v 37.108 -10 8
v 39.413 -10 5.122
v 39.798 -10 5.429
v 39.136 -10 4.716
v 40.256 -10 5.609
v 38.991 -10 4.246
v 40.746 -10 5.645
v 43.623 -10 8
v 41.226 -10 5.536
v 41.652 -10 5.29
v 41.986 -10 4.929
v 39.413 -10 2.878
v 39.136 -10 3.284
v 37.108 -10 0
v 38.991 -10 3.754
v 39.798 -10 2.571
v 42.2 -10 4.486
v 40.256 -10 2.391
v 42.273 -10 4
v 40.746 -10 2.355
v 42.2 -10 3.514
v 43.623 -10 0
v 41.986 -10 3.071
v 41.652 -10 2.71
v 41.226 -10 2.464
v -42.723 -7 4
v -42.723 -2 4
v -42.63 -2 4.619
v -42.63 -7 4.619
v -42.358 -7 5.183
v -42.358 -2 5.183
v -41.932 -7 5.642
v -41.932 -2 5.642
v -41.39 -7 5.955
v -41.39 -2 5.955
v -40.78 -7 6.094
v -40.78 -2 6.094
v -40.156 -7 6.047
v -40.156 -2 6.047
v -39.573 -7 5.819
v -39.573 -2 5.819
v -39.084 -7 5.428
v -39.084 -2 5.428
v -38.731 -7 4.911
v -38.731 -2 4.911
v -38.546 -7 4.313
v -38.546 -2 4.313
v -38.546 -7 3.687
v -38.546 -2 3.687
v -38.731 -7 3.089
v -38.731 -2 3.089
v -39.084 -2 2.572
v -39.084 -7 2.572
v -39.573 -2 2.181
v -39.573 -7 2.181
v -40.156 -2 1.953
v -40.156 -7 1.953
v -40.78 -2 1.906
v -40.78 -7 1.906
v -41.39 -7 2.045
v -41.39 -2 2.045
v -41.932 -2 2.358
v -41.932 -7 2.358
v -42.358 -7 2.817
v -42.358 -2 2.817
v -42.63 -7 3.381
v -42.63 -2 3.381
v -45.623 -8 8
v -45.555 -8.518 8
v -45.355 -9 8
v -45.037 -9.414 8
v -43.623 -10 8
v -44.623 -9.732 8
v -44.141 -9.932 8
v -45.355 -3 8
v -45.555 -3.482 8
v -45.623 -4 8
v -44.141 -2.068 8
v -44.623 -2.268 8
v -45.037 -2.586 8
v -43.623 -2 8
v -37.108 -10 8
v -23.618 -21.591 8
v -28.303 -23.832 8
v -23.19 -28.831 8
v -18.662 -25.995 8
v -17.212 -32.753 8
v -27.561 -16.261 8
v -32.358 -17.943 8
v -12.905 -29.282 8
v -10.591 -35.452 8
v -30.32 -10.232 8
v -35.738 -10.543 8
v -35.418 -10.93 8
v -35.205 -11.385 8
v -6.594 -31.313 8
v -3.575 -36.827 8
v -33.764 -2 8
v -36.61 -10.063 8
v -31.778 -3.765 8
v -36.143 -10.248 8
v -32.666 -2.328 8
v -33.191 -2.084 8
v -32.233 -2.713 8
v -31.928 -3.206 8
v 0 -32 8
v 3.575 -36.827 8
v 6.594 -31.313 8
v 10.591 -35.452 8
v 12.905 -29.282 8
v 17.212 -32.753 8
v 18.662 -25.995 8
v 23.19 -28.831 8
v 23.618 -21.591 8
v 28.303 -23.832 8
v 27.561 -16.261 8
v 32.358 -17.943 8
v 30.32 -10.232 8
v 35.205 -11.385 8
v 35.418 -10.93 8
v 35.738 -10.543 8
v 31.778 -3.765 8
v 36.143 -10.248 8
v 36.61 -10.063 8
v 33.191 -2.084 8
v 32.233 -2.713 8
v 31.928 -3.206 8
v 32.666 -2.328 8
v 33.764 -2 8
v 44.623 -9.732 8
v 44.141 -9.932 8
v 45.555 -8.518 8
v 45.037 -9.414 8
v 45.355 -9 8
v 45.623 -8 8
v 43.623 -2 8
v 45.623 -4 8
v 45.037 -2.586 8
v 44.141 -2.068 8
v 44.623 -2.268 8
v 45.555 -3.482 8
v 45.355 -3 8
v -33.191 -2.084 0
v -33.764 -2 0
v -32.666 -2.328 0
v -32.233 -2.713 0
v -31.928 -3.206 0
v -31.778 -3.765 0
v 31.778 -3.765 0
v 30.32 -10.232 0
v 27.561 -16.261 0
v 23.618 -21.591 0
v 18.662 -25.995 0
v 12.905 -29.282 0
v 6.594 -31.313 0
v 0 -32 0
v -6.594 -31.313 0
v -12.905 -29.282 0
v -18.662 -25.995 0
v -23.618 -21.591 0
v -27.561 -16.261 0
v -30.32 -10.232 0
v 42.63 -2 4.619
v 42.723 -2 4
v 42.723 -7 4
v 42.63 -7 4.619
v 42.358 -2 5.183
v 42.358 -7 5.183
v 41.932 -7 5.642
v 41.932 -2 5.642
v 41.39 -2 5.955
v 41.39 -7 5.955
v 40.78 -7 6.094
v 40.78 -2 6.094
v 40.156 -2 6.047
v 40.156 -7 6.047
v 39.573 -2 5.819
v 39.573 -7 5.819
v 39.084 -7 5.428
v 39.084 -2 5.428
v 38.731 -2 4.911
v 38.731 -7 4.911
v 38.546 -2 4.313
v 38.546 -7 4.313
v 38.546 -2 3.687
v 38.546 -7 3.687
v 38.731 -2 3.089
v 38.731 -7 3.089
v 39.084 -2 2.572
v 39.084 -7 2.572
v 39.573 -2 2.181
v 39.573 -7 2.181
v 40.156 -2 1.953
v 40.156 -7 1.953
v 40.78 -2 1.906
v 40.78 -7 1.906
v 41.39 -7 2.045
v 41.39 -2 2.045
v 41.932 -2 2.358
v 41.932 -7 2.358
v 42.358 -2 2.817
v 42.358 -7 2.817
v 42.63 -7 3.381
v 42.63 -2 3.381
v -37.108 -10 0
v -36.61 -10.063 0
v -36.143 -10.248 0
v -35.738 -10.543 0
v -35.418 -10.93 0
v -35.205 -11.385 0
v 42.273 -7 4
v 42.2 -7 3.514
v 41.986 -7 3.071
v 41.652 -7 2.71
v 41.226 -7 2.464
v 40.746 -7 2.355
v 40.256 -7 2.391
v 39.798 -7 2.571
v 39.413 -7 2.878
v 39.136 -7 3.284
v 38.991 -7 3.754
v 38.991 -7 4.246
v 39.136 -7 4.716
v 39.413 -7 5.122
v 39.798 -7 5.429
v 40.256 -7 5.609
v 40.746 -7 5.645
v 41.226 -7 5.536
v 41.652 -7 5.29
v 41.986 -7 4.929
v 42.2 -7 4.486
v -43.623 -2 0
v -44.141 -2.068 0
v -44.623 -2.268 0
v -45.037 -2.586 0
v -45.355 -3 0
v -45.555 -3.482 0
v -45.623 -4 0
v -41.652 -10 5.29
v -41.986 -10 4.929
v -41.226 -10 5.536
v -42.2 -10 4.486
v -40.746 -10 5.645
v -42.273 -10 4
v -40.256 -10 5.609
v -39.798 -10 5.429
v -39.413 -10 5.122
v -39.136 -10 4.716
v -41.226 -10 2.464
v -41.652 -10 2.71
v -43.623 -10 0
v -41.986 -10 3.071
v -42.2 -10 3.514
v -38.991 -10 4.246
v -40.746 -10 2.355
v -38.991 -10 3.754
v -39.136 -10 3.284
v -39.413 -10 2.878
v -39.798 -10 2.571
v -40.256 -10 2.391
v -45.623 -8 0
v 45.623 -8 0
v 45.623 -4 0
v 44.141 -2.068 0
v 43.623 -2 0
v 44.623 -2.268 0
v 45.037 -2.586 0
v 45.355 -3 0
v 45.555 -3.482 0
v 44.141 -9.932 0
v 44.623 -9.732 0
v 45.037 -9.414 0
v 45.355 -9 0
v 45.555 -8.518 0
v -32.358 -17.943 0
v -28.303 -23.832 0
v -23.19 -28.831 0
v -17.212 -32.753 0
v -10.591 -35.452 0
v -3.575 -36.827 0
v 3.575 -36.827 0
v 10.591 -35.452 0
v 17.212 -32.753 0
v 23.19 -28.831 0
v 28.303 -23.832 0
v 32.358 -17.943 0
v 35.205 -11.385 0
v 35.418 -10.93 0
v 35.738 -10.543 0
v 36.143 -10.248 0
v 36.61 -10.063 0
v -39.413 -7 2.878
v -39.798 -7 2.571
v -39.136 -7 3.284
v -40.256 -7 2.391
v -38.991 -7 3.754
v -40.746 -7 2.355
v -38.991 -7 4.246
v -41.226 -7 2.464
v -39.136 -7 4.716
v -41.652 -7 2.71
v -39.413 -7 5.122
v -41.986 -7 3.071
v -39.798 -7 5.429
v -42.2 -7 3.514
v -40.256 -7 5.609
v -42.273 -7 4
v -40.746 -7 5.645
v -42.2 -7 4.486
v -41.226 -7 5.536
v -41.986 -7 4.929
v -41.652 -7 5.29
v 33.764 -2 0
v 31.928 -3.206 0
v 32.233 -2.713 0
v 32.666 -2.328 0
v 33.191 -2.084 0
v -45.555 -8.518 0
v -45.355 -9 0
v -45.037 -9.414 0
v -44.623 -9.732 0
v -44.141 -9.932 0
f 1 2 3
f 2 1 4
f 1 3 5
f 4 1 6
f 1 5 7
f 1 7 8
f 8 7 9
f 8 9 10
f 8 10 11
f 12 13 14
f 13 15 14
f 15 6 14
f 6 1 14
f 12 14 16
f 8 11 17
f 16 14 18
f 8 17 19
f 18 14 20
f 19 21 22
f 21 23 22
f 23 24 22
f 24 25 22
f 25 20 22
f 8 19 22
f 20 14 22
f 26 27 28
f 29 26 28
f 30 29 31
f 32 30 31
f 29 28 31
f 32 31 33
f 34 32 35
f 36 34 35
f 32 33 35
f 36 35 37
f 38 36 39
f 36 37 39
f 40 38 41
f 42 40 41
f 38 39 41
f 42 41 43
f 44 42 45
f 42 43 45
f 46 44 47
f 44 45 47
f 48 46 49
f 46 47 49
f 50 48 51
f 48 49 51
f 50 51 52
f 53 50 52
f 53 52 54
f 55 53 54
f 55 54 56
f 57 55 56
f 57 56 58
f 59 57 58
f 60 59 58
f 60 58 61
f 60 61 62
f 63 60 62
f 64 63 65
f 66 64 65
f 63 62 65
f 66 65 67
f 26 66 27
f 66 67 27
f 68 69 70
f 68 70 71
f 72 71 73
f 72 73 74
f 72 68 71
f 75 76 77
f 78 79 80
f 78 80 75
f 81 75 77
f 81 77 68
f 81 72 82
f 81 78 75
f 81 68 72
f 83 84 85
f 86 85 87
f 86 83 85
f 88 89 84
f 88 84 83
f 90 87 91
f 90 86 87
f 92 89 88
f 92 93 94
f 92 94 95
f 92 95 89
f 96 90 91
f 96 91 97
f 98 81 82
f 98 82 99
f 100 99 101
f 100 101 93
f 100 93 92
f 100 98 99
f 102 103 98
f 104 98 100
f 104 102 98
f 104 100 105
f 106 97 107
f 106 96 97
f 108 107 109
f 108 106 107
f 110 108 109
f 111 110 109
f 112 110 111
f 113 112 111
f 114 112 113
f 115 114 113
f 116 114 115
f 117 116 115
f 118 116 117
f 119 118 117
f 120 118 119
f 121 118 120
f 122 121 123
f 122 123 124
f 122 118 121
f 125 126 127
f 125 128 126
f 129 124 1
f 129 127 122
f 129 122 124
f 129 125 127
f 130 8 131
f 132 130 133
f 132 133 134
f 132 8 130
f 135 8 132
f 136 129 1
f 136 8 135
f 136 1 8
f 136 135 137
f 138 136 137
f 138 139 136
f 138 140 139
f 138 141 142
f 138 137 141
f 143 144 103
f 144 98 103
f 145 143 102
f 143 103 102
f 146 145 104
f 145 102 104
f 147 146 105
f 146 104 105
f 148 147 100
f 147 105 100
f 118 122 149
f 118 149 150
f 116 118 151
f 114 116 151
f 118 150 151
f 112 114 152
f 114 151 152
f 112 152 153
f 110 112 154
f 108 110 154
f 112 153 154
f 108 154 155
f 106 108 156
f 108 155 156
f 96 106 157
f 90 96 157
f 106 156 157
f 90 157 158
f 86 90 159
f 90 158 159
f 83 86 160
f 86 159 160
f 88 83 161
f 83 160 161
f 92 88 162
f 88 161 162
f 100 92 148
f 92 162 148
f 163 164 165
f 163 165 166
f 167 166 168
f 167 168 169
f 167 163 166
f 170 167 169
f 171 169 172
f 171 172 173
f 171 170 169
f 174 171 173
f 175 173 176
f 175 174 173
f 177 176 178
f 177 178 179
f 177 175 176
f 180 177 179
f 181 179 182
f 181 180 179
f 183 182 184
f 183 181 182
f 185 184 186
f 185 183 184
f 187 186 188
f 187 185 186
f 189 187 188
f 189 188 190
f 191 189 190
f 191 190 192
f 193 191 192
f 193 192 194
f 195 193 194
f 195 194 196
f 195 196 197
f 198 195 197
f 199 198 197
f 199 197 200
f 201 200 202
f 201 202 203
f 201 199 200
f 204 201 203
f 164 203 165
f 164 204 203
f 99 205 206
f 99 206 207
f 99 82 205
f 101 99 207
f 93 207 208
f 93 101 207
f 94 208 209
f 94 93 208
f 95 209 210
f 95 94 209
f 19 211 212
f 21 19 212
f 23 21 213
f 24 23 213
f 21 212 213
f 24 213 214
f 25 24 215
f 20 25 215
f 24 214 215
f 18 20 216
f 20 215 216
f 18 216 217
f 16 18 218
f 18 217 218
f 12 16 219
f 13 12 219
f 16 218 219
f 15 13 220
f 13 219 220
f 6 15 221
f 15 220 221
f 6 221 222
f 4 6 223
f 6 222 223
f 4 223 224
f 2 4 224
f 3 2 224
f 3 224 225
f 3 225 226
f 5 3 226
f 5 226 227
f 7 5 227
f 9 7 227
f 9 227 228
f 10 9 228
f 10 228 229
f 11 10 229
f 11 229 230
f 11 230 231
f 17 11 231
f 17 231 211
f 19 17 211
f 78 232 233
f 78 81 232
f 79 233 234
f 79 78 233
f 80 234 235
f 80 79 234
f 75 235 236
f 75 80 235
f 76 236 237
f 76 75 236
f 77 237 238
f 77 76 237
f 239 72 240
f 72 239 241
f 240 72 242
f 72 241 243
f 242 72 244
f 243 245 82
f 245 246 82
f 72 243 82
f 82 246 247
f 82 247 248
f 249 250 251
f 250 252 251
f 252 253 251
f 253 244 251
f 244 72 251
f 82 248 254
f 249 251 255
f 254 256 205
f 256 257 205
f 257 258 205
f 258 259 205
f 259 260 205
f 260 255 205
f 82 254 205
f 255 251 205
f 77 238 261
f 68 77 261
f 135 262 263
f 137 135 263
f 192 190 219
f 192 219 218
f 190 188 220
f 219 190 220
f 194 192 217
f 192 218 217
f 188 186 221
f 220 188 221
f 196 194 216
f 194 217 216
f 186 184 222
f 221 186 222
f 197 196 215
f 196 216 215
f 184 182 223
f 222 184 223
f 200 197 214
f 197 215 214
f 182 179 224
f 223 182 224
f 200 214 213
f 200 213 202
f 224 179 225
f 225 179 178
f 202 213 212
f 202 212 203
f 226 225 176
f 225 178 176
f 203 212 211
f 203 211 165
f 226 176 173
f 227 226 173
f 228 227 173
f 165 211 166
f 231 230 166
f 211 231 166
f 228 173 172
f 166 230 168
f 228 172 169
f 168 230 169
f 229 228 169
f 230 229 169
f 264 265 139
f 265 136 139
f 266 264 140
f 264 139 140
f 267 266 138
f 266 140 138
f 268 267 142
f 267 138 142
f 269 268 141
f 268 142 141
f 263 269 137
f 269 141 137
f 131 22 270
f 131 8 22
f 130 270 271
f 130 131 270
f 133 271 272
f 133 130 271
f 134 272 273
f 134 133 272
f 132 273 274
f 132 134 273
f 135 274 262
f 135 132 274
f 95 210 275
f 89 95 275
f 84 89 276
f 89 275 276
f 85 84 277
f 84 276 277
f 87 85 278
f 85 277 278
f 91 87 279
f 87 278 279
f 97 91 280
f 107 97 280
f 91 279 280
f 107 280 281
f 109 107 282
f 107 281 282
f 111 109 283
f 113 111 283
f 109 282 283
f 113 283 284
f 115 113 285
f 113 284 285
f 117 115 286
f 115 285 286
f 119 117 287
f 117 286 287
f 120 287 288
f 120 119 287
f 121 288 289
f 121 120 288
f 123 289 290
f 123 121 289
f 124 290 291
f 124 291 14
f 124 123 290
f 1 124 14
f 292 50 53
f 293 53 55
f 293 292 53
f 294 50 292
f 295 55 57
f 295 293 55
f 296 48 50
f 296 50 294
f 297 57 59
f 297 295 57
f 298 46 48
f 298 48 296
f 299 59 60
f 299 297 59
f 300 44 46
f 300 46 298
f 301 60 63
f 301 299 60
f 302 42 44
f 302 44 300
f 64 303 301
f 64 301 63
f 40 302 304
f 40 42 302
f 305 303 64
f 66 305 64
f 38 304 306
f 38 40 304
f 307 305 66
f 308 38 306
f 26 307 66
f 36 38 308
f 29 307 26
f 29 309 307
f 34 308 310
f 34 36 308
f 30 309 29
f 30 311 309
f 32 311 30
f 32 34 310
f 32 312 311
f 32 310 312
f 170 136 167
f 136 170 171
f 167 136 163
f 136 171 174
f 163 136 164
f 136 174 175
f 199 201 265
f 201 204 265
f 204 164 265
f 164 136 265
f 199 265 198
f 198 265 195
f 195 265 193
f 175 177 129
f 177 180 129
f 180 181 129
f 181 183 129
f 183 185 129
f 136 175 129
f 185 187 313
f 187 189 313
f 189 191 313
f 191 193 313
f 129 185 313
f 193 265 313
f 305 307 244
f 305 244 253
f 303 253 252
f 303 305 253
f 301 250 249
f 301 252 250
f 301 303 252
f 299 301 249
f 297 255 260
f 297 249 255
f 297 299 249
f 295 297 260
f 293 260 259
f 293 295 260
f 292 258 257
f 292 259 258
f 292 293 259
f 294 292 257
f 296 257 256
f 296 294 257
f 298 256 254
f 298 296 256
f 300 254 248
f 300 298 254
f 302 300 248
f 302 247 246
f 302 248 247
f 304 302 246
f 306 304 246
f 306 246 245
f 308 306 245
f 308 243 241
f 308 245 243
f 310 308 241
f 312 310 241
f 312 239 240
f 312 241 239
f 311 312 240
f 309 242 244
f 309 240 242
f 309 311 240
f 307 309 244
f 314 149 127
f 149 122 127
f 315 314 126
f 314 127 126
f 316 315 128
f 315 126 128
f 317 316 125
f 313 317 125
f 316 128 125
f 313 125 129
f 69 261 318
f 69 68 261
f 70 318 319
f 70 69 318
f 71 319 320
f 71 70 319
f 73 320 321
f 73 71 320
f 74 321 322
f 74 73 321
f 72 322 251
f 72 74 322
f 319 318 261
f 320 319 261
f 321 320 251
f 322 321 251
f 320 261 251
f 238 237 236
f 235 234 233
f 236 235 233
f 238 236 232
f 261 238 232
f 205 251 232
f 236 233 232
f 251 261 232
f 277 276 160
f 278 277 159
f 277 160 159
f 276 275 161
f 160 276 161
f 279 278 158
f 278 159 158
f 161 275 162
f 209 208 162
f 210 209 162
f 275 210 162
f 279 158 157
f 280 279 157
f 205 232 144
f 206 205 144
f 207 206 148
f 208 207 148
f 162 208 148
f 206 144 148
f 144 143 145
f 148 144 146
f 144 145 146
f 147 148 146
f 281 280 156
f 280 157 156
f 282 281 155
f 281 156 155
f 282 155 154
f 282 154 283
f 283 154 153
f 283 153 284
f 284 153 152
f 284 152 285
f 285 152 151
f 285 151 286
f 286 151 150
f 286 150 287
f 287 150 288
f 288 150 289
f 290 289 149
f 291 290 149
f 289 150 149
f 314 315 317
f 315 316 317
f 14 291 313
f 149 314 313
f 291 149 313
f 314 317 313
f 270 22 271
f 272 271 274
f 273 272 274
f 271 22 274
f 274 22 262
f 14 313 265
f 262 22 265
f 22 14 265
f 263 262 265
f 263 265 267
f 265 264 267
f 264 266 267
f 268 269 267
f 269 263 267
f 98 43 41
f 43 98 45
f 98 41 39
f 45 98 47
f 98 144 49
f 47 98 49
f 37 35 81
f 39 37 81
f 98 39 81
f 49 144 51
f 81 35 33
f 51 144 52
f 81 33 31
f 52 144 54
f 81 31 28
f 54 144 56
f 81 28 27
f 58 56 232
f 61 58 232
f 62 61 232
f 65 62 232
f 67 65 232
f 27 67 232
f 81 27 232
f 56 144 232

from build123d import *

# Parameters (mm, degrees)
BOSS_EXTRUDE1_DEPTH = 8
SKETCH5_R           = 2.1
CUT_EXTRUDE1_DEPTH  = 5
SKETCH6_R           = 1.65
CUT_EXTRUDE2_DEPTH  = 36
FILLET1_R           = 2


with BuildPart() as part:
    # Sketch3 → Boss-Extrude1 (new body)
    with BuildSketch(Plane.XY):
        with BuildLine():
            Line((-31.937438845, -2), (-45.623026261, -2))
            Line((-45.623026261, -2), (-45.623026261, -10))
            Line((-45.623026261, -10), (-35.623026261, -10))
            ThreePointArc((-35.623026261, -10), (0, -37), (35.623026261, -10))
            Line((35.623026261, -10), (45.623026261, -10))
            Line((45.623026261, -10), (45.623026261, -2))
            Line((45.623026261, -2), (31.937438845, -2))
            ThreePointArc((31.937438845, -2), (0, -32), (-31.937438845, -2))
        make_face()
    extrude(amount=BOSS_EXTRUDE1_DEPTH)

    # Sketch5 → Cut-Extrude1 (cut)
    with BuildSketch(Plane.XZ.offset(2)):
        with Locations((40.623026261, 4)):
            Circle(SKETCH5_R)
    cut_extrude1 = extrude(amount=CUT_EXTRUDE1_DEPTH, mode=Mode.SUBTRACT)

    # Sketch6 → Cut-Extrude2 (cut, through all)
    with BuildSketch(Plane(origin=(0, -2, 0), x_dir=(1, 0, 0), z_dir=(0, 1, 0))):
        with Locations((40.623026261, -4)):
            Circle(SKETCH6_R)
    cut_extrude2 = extrude(amount=-CUT_EXTRUDE2_DEPTH, mode=Mode.SUBTRACT)

    # Mirror1: Cut-Extrude1, Cut-Extrude2 across plane
    add(cut_extrude1.mirror(Plane(origin=(0, 0, 0), x_dir=(0, 0, 1), z_dir=(1, 0, 0))), mode=Mode.SUBTRACT)
    add(cut_extrude2.mirror(Plane(origin=(0, 0, 0), x_dir=(0, 0, 1), z_dir=(1, 0, 0))), mode=Mode.SUBTRACT)

    # Fillet1
    fillet1_edges = [part.edges().sort_by_distance(p)[0] for p in [
        (-45.623026261, -2, 4),
        (-31.937438845, -2, 4),
        (31.937438845, -2, 4),
        (45.623026261, -2, 4),
        (45.623026261, -10, 4),
        (35.623026261, -10, 4),
        (-35.623026261, -10, 4),
        (-45.623026261, -10, 4),
    ]]
    fillet(fillet1_edges, radius=FILLET1_R)


solid = part.part
